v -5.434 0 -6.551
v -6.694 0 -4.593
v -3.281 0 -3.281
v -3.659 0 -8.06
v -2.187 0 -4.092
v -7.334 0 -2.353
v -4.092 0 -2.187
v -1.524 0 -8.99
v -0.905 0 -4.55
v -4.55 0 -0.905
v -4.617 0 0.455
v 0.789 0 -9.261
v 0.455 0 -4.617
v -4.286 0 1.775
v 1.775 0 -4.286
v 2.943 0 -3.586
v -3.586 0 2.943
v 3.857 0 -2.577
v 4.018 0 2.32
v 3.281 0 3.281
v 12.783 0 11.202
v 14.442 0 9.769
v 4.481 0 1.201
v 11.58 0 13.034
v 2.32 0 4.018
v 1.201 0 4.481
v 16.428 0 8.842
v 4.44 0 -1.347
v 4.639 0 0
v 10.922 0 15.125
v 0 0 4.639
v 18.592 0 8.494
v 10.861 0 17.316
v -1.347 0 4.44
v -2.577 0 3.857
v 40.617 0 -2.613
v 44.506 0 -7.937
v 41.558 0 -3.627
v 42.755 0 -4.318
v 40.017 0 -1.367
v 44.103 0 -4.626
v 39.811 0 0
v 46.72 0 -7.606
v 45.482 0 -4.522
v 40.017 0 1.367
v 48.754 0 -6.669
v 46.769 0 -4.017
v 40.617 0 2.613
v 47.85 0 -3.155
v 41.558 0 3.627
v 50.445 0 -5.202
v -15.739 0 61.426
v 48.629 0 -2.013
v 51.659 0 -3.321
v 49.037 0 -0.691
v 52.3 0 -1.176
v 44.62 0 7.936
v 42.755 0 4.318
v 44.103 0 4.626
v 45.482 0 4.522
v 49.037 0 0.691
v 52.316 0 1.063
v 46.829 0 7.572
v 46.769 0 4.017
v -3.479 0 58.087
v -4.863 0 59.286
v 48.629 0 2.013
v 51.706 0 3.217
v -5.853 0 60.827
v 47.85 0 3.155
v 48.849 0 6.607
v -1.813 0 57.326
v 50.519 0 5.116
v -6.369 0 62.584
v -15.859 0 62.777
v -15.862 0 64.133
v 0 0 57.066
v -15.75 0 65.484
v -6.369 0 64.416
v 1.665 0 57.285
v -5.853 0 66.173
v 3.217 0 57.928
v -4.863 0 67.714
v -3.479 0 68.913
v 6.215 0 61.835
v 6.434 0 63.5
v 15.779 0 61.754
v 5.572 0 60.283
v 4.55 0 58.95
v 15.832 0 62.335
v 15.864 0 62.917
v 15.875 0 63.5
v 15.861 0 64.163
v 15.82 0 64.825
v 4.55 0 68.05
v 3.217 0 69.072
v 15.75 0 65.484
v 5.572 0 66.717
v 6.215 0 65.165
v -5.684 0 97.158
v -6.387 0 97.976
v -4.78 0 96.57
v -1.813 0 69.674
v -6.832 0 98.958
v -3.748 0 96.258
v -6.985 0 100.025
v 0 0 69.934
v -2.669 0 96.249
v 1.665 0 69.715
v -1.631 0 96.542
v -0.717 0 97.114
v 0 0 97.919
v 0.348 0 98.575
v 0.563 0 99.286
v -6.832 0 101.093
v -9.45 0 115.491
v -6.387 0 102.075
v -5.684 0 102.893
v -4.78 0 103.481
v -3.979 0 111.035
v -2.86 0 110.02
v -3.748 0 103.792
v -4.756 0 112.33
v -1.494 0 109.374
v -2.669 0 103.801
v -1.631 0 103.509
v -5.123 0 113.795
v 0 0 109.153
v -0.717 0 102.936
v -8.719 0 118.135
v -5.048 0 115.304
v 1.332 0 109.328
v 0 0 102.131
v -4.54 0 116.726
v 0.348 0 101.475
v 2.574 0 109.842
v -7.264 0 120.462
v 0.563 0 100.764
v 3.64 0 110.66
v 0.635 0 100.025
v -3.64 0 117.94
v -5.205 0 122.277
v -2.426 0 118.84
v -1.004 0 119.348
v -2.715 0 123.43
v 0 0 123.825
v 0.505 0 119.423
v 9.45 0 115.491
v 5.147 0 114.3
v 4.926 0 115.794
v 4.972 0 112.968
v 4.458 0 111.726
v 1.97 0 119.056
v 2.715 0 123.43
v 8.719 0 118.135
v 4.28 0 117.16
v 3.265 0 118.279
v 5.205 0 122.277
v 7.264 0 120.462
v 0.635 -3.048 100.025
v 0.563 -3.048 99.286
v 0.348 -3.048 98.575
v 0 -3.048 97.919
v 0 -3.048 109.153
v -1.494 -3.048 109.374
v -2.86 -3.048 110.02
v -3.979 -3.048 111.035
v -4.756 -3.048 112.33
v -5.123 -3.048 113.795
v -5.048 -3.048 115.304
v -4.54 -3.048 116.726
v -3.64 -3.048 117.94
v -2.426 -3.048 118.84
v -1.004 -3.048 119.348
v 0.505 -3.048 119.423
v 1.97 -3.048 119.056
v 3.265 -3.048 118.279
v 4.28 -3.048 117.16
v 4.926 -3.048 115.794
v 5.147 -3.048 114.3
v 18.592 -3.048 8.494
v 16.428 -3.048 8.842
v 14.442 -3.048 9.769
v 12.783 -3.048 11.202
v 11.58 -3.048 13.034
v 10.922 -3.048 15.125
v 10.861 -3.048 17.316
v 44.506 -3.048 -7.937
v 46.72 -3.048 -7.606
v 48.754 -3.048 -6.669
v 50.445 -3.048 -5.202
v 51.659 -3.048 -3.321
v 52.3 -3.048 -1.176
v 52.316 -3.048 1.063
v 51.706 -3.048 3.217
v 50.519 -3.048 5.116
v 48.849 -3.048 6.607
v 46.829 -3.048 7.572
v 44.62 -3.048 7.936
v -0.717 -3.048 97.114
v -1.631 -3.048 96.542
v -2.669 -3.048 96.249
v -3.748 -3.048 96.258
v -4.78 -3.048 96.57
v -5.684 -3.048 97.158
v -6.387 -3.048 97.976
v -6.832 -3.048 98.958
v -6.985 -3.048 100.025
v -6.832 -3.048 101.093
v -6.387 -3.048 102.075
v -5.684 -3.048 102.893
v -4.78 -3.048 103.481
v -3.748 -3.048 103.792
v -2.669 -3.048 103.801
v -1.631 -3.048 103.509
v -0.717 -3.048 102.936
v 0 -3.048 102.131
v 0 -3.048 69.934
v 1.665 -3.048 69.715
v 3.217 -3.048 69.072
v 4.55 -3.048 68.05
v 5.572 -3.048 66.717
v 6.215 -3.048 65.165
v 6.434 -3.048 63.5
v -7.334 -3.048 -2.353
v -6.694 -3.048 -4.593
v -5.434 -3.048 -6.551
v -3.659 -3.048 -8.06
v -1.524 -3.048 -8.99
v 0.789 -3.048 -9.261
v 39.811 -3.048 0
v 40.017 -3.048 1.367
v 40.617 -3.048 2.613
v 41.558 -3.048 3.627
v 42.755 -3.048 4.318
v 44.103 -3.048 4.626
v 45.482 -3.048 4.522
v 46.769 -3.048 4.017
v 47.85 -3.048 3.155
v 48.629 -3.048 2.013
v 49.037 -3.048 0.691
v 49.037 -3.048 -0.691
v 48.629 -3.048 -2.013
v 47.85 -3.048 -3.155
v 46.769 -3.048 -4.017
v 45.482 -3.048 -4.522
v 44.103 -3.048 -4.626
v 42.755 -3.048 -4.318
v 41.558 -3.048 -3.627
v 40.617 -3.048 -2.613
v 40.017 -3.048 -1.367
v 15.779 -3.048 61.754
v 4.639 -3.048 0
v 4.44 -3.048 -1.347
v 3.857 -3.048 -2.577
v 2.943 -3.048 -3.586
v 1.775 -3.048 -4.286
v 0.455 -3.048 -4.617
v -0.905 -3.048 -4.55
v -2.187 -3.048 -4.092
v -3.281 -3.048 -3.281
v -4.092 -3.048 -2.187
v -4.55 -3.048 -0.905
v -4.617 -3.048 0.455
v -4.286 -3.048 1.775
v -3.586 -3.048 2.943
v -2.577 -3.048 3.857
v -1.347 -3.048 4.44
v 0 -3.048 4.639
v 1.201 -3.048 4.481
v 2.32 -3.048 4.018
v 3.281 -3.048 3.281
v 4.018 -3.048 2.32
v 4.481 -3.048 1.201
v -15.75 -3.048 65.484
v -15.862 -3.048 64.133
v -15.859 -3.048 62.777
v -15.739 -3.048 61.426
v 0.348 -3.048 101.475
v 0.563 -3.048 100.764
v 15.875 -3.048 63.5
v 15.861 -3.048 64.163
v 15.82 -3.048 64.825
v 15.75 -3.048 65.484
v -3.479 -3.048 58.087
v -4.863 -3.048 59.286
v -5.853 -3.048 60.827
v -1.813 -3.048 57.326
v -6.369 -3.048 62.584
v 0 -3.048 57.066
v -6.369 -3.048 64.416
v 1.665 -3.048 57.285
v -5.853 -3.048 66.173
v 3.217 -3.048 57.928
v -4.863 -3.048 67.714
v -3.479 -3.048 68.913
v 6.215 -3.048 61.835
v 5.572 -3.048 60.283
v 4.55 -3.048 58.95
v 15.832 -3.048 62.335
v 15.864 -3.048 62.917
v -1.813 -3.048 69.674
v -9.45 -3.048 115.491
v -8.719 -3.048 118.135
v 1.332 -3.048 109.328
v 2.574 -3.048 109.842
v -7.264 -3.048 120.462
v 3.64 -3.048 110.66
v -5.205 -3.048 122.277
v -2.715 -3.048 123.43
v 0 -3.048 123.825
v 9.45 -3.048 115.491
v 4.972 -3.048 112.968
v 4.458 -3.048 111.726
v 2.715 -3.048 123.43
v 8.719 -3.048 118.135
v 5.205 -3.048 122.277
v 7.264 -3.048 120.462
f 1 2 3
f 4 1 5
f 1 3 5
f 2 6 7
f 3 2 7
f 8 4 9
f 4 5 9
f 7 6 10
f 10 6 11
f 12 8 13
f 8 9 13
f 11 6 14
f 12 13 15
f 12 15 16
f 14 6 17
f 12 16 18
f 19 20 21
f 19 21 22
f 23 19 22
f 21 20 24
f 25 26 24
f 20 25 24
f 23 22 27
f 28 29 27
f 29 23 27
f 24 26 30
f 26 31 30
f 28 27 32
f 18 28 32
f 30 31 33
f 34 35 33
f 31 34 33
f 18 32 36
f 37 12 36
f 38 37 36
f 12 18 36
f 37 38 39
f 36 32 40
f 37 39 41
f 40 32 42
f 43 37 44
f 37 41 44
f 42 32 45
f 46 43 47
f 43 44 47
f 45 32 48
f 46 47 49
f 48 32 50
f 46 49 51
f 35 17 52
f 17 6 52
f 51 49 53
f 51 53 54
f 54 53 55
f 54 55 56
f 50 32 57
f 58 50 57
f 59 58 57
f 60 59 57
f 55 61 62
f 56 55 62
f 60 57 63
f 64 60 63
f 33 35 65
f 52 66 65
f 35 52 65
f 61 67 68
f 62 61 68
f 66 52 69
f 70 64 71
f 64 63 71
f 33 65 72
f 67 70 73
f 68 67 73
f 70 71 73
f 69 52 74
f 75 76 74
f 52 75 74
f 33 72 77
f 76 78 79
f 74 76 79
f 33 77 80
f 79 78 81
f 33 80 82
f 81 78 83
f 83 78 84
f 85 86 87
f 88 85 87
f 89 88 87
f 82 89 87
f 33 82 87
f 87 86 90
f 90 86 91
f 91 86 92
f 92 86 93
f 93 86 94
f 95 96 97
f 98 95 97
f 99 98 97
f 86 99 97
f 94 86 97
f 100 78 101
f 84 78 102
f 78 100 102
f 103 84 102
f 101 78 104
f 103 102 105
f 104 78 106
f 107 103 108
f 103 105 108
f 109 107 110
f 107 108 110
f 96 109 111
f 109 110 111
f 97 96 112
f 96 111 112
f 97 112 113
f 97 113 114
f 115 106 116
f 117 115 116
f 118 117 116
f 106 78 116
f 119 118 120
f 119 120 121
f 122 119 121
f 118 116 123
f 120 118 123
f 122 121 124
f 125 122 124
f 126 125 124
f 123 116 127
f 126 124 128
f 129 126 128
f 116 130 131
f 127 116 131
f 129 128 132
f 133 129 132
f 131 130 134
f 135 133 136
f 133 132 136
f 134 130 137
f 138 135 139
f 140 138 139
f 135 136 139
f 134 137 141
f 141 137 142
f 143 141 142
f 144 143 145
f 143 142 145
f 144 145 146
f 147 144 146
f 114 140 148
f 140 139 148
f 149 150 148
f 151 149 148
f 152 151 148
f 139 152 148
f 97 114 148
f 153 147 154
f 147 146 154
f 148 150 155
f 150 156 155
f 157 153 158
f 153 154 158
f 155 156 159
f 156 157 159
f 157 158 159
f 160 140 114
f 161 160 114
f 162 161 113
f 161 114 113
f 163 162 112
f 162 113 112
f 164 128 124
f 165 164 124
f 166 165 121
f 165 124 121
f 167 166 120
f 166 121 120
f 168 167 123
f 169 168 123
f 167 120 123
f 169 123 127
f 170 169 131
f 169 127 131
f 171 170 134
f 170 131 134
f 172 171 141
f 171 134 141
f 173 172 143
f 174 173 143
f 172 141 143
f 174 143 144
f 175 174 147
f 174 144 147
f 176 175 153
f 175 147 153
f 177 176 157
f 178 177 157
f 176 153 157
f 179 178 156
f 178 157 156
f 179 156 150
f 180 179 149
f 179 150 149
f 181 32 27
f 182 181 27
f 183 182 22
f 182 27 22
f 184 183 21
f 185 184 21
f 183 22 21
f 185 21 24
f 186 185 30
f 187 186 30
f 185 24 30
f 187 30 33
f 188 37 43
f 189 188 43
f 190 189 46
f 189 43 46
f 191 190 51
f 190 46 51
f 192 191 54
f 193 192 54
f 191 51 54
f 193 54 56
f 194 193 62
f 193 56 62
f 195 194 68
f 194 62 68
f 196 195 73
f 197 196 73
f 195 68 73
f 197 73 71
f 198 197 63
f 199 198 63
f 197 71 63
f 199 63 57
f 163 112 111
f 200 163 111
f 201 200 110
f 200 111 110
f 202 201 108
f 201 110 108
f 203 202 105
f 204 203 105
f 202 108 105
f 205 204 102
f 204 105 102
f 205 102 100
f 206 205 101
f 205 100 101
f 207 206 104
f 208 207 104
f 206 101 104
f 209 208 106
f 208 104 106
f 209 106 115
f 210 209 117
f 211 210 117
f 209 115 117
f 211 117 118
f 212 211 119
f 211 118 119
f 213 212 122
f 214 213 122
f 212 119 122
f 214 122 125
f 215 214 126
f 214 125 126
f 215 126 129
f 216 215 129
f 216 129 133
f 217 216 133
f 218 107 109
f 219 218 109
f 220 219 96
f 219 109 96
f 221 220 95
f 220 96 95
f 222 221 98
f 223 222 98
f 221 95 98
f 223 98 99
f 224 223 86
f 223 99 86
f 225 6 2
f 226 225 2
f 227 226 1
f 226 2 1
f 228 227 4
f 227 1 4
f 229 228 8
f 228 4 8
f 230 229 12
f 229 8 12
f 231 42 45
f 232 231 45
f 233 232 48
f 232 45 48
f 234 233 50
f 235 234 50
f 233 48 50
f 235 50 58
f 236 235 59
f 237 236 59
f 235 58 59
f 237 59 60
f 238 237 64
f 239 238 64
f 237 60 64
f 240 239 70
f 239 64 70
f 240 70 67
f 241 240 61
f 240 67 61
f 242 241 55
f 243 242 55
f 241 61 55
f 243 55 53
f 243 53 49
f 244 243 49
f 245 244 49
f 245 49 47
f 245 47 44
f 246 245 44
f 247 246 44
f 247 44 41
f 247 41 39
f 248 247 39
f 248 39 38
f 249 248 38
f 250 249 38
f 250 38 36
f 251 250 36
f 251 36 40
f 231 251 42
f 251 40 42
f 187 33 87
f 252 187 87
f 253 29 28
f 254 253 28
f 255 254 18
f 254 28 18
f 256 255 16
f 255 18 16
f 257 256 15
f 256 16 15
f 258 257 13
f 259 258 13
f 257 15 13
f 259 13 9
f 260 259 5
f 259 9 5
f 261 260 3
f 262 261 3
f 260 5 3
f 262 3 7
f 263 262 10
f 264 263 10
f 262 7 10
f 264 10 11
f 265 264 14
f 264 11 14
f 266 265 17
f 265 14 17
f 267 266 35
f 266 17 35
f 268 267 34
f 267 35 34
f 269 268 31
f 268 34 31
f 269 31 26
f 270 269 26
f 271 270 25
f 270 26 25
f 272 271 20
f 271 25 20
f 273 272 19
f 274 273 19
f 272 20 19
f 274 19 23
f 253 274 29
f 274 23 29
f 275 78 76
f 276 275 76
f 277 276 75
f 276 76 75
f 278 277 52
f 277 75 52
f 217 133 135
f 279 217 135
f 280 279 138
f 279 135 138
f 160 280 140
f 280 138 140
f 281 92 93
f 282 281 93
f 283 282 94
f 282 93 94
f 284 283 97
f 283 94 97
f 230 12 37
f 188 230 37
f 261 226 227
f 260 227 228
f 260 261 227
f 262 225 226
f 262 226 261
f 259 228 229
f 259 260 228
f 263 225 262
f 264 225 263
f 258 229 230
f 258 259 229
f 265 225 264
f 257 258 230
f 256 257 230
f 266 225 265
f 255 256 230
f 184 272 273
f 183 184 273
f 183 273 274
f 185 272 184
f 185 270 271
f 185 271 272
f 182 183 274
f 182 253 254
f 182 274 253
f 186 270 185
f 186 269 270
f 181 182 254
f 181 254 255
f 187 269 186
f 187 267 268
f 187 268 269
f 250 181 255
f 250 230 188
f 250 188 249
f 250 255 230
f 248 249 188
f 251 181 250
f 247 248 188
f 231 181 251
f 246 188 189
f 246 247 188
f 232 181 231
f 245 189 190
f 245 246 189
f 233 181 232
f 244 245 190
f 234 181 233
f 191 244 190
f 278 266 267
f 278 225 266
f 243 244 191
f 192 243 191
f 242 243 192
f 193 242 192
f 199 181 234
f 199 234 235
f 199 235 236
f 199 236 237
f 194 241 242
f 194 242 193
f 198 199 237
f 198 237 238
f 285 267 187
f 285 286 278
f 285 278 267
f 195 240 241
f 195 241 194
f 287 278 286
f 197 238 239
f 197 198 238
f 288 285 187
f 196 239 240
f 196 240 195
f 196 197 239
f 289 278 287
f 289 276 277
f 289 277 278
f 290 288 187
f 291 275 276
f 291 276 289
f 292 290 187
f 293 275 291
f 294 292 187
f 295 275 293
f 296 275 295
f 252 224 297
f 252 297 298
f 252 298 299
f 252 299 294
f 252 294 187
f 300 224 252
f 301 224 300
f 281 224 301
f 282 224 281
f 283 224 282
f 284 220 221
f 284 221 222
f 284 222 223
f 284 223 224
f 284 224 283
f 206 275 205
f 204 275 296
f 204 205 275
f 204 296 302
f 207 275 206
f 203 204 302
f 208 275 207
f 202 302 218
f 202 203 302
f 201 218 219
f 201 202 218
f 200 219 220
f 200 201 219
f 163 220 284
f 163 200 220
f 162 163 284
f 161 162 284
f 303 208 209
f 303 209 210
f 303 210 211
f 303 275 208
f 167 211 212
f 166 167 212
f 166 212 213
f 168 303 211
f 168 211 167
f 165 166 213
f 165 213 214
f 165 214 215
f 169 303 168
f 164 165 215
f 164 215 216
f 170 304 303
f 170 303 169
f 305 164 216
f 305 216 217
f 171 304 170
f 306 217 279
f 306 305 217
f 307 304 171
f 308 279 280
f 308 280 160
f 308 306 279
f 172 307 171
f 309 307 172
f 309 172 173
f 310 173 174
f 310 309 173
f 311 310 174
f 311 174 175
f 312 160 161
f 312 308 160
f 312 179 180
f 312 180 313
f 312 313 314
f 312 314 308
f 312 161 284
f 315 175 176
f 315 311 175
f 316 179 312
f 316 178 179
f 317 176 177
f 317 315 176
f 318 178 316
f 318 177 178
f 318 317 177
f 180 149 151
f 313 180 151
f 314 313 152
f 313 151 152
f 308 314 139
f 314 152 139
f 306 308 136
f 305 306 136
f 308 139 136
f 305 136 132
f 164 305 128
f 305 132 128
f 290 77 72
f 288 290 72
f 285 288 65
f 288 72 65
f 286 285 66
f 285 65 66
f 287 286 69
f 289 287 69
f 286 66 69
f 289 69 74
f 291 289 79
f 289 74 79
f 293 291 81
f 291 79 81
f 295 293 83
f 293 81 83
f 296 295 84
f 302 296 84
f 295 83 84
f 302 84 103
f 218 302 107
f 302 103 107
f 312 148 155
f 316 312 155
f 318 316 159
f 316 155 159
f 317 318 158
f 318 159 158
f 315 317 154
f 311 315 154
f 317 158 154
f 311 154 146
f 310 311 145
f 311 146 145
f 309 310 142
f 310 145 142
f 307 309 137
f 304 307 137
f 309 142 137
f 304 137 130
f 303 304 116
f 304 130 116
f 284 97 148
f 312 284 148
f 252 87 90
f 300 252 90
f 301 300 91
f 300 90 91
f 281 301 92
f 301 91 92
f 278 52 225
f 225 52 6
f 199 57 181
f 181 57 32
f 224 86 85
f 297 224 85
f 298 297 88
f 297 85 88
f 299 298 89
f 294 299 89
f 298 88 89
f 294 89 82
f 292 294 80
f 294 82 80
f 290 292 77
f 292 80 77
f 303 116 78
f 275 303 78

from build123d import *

# Parameters (mm, degrees)
F1_DEPTH = 3.048


with BuildPart() as f1:
    # F0 (on Front) → F1 (new body)
    with BuildSketch(Plane.XZ):
        with BuildLine():
            ThreePointArc((-9.4502929642, 115.490625), (-7.14375, 107.9998046905), (0, 104.775))
            ThreePointArc((0, 104.775), (6.7351920908, 107.5648079092), (9.525, 114.3))
            ThreePointArc((9.525, 114.3), (9.5063048942, 114.896483242), (9.4502929642, 115.490625))
            ThreePointArc((9.4502929642, 115.490625), (0, 123.825), (-9.4502929642, 115.490625))
        make_face()
        with BuildLine():
            ThreePointArc((5.1473989497, 114.3), (3.6397607028, 110.6602392972), (0, 109.1526010503))
            ThreePointArc((0, 109.1526010503), (-3.6397607028, 117.9397607028), (5.1473989497, 114.3))
        make_face(mode=Mode.SUBTRACT)
        with BuildLine():
            ThreePointArc((9.525, 114.3), (6.7351920908, 107.5648079092), (0, 104.775))
            Line((0, 104.775), (0, 102.1312567419))
            ThreePointArc((0, 102.1312567419), (0.4727972806, 101.1250522628), (0.635, 100.0252))
            ThreePointArc((0.635, 100.0252), (0.4727972806, 98.9253477372), (0, 97.9191432581))
            Line((0, 97.9191432581), (0, 79.375))
            ThreePointArc((0, 79.375), (10.5003255158, 75.40625), (15.7504882737, 65.484375))
            Line((15.7504882737, 65.484375), (9.4502929642, 115.490625))
            ThreePointArc((9.4502929642, 115.490625), (9.5063048942, 114.896483242), (9.525, 114.3))
        make_face()
        with BuildLine():
            Line((0, 102.1312567419), (0, 104.775))
            ThreePointArc((0, 104.775), (-7.14375, 107.9998046905), (-9.4502929642, 115.490625))
            Line((-9.4502929642, 115.490625), (-15.7504882737, 65.484375))
            ThreePointArc((-15.7504882737, 65.484375), (-10.5003255158, 75.40625), (0, 79.375))
            Line((0, 79.375), (0, 97.9191432581))
            ThreePointArc((0, 97.9191432581), (-6.985, 100.0252), (0, 102.1312567419))
        make_face()
        with BuildLine():
            ThreePointArc((0, 79.375), (-10.5003255158, 75.40625), (-15.7504882737, 65.484375))
            ThreePointArc((-15.7504882737, 65.484375), (-15.8749354575, 63.4547316886), (-15.7389150973, 61.4258311158))
            ThreePointArc((-15.7389150973, 61.4258311158), (-10.4663315914, 51.5638562333), (0, 47.625))
            Line((0, 47.625), (0, 57.0657531906))
            ThreePointArc((0, 57.0657531906), (-6.4342468094, 63.5), (0, 69.9342468094))
            Line((0, 69.9342468094), (0, 79.375))
        make_face()
        with BuildLine():
            ThreePointArc((15.7504882737, 65.484375), (10.5003255158, 75.40625), (0, 79.375))
            Line((0, 79.375), (0, 69.9342468094))
            ThreePointArc((0, 69.9342468094), (4.5496995508, 68.0496995508), (6.4342468094, 63.5))
            ThreePointArc((6.4342468094, 63.5), (4.5496995508, 58.9503004492), (0, 57.0657531906))
            Line((0, 57.0657531906), (0, 47.625))
            ThreePointArc((0, 47.625), (10.5899458509, 51.6733913621), (15.7786639465, 61.75375))
            ThreePointArc((15.7786639465, 61.75375), (15.8508976899, 62.6255473572), (15.875, 63.5))
            ThreePointArc((15.875, 63.5), (15.8438414904, 64.4941387366), (15.7504882737, 65.484375))
        make_face()
        with BuildLine():
            ThreePointArc((0, 47.625), (-10.4663315914, 51.5638562333), (-15.7389150973, 61.4258311158))
            Line((-15.7389150973, 61.4258311158), (-7.3336929022, -2.3534876791))
            ThreePointArc((-7.3336929022, -2.3534876791), (-4.6020954107, -7.371024327), (0.7890227862, -9.261300353))
            Line((0.7890227862, -9.261300353), (44.5059455788, -7.937302838))
            ThreePointArc((44.5059455788, -7.937302838), (38.85715465, -5.6324050938), (36.5125, 0))
            Line((36.5125, 0), (4.6393582615, 0))
            ThreePointArc((4.6393582615, 0), (-3.2805216871, -3.2805216871), (0, 4.6393582615))
            Line((0, 4.6393582615), (0, 47.625))
        make_face()
        with BuildLine():
            ThreePointArc((15.7786639465, 61.75375), (10.5899458509, 51.6733913621), (0, 47.625))
            Line((0, 47.625), (0, 4.6393582615))
            ThreePointArc((0, 4.6393582615), (3.2805216871, 3.2805216871), (4.6393582615, 0))
            Line((4.6393582615, 0), (36.5125, 0))
            ThreePointArc((36.5125, 0), (38.8978012218, 5.6724769702), (44.6200892857, 7.9356774055))
            Line((44.6200892857, 7.9356774055), (18.5923091973, 8.4935436465))
            ThreePointArc((18.5923091973, 8.4935436465), (12.7834191375, 11.2022395504), (10.8607157214, 17.3164401359))
            Line((10.8607157214, 17.3164401359), (15.7786639465, 61.75375))
        make_face()
        with BuildLine():
            ThreePointArc((36.5125, 0), (38.85715465, -5.6324050938), (44.5059455788, -7.937302838))
            ThreePointArc((44.5059455788, -7.937302838), (50.0824050938, -5.59284535), (52.3875, 0))
            ThreePointArc((52.3875, 0), (50.1224769702, 5.5521987782), (44.6200892857, 7.9356774055))
            ThreePointArc((44.6200892857, 7.9356774055), (38.8978012218, 5.6724769702), (36.5125, 0))
        make_face()
        with BuildLine():
            ThreePointArc((49.088644138, 0), (44.45, -4.638644138), (39.811355862, 0))
            ThreePointArc((39.811355862, 0), (44.45, 4.638644138), (49.088644138, 0))
        make_face(mode=Mode.SUBTRACT)
    extrude(amount=F1_DEPTH)


solid = f1.part
